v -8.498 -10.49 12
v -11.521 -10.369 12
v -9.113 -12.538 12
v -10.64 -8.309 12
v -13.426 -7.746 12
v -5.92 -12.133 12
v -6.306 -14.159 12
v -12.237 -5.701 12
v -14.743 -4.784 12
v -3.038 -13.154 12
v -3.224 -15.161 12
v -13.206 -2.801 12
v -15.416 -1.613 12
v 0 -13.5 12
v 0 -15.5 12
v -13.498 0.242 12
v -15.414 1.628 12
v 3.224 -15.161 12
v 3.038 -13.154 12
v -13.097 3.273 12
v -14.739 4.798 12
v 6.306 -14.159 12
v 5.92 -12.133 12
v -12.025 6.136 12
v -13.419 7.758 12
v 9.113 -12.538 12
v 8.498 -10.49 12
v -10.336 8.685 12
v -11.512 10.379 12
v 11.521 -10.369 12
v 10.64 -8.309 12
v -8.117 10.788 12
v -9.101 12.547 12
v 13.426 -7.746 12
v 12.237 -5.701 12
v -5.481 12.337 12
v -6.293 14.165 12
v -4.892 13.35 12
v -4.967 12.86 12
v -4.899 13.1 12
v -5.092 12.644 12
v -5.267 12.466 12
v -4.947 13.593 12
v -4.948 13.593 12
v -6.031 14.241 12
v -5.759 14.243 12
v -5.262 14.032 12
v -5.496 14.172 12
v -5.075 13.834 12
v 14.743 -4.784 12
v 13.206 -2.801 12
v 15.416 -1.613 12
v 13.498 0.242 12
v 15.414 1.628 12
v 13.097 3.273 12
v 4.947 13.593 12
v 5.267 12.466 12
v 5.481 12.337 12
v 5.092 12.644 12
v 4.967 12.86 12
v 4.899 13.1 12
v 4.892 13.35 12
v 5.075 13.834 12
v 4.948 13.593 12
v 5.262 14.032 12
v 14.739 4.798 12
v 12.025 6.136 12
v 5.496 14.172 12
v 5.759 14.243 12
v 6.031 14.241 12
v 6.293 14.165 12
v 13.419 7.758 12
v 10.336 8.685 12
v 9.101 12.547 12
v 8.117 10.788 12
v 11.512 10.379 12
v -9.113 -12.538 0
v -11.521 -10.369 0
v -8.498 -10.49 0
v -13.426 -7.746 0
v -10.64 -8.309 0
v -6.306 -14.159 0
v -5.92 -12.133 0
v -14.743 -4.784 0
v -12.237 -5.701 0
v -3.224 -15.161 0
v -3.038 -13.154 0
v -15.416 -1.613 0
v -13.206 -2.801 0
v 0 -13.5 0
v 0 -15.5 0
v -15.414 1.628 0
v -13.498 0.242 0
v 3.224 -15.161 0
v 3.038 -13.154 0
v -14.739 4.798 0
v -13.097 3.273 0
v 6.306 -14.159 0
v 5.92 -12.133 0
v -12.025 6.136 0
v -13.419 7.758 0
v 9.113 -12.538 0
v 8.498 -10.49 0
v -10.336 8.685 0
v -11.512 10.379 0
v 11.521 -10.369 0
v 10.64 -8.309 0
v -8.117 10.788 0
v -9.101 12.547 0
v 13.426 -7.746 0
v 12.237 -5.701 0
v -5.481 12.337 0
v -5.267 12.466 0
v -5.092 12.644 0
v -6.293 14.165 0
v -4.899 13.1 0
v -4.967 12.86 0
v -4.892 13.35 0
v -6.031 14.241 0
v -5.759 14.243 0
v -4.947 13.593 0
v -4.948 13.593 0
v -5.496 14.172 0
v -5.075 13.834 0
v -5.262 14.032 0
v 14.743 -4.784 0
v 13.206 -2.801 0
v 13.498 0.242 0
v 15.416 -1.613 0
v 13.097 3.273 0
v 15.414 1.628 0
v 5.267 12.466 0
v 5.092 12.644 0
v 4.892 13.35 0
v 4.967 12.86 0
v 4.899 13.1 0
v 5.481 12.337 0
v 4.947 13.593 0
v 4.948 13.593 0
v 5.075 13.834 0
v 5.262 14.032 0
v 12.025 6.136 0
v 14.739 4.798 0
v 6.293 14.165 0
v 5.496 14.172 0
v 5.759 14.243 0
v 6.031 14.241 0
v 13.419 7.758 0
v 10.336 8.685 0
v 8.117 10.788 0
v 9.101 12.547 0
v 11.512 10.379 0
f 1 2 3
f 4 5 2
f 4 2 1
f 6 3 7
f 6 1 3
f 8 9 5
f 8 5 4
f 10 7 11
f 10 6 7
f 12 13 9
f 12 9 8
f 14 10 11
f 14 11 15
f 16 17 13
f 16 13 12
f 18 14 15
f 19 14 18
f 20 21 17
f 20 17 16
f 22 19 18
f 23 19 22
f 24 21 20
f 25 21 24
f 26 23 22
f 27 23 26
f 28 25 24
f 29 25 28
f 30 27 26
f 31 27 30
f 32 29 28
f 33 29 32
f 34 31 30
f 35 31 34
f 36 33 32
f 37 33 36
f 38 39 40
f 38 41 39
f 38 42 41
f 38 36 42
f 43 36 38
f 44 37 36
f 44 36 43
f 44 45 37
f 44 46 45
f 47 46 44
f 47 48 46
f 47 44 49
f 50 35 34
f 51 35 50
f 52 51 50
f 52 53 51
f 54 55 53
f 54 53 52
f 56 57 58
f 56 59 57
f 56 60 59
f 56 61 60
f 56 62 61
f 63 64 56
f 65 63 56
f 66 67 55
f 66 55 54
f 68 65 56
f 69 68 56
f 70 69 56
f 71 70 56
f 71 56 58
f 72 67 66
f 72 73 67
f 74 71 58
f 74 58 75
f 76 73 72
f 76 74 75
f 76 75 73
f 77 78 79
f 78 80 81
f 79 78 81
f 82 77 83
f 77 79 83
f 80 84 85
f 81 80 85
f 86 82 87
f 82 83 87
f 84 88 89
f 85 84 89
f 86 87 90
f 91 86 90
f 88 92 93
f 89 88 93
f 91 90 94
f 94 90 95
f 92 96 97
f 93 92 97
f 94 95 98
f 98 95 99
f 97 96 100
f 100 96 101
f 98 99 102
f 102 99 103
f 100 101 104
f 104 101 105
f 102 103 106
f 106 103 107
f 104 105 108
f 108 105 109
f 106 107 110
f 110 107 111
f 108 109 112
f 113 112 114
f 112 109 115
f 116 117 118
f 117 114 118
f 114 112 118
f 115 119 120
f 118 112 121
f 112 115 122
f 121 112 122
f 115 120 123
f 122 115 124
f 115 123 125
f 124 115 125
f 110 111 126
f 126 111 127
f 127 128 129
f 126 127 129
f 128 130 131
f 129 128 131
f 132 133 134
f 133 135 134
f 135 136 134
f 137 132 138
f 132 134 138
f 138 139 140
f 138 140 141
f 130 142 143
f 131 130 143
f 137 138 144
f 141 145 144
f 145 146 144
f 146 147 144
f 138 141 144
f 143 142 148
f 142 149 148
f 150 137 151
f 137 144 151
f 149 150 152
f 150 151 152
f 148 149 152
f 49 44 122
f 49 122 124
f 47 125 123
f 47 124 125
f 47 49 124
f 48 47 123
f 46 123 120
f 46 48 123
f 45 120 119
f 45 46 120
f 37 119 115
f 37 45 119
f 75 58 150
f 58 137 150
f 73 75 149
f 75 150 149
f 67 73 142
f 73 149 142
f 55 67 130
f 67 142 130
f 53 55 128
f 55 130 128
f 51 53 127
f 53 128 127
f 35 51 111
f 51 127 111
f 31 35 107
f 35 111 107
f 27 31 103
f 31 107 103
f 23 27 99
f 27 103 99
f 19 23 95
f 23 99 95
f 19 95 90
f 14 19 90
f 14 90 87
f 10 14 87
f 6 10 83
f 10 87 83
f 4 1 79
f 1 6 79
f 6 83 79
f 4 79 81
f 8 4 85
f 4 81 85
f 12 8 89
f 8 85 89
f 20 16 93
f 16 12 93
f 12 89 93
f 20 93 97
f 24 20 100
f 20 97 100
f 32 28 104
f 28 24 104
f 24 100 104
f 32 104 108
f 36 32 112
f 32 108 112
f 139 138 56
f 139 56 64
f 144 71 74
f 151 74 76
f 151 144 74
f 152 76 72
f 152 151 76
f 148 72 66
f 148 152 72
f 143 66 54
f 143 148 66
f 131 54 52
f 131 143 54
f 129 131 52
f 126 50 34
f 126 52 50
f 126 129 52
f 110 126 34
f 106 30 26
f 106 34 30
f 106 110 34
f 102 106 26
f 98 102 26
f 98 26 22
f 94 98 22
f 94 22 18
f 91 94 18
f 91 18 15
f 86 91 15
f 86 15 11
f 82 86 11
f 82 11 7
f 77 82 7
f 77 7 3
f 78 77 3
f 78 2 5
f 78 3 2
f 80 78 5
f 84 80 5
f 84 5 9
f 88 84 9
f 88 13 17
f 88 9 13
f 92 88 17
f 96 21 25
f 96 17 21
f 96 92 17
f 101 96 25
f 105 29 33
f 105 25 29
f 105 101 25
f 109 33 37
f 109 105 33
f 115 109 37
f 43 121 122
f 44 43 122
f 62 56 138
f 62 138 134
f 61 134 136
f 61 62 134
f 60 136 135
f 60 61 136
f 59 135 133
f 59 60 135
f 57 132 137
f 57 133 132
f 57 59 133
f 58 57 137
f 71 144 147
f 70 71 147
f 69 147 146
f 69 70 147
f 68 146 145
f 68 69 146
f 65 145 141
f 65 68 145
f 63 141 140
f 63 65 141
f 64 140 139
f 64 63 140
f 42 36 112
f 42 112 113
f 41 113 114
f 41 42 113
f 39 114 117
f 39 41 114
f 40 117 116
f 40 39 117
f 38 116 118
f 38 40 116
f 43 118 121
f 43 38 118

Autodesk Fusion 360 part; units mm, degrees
sketch "Sketch1" plane through (0, 0, 0) normal (0, 0, 1) x (1, 0, 0)
  circle A0 centre (0, 0) radius 13.5
  circle A1 centre (0, 0) radius 15.5
  line L0 (0, 0) -> (-5.3013, 14.5652)
  line L1 (0, 0) -> (5.3013, 14.5652)
  line L2 (0, 0) -> (0, 25)
  dimension "d1" = 27
  dimension "d2" = 31
  dimension "d3" = 20
  dimension "d4" = 20
extrude "Extrude1" add sketch "Sketch1" along normal blind 12 contours A0 A1 L0 L1
fillet "Fillet1" radius 1 4 edges at (-5.3013, 14.5652, 6) (-4.6173, 12.6859, 6) (4.6173, 12.6859, 6) (5.3013, 14.5652, 6)
equation "d2 = d1 + 4 mm"
equation "d4 = d3"
